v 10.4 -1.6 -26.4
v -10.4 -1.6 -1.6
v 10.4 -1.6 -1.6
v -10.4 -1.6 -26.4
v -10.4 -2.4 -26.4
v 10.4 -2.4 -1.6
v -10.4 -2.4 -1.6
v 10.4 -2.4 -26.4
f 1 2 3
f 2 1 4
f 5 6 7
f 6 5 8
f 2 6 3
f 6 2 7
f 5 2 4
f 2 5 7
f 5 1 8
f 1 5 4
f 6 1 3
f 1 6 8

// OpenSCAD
// file: ../p/4-4edge.scad
use <../lib.scad>
$fa=1; $fs=0.2;
function ldraw_lib__4_4edge(realsolid=false) = [
// 0 Circle 1.0
// 0 Name: 4-4edge.dat
// 0 Author: James Jessiman
// 0 !LDRAW_ORG Primitive UPDATE 2017-01
// 0 !LICENSE Licensed under CC BY 2.0 and CC BY 4.0 : see CAreadme.txt
// 
// 0 BFC CERTIFY CCW
  [0,"BFC","CERTIFY"],
  [0,"BFC","CCW"],
// 
// 0 !HISTORY 1998-12-15 [PTadmin] Official Update 1998-10
// 0 !HISTORY 2005-12-28 [PTadmin] Official Update 2005-01
// 0 !HISTORY 2007-06-24 [PTadmin] Header formatted for Contributor Agreement
// 0 !HISTORY 2008-07-01 [PTadmin] Official Update 2008-01
// 0 !HISTORY 2017-01-15 [Steffen] BFCed
// 0 !HISTORY 2017-12-30 [PTadmin] Official Update 2017-01
// 
// 
// 2 24 1 0 0 0.9239 0 0.3827
  [2,24,1,0,0,0.9239,0,0.3827],
// 2 24 0.9239 0 0.3827 0.7071 0 0.7071
  [2,24,0.9239,0,0.3827,0.7071,0,0.7071],
// 2 24 0.7071 0 0.7071 0.3827 0 0.9239
  [2,24,0.7071,0,0.7071,0.3827,0,0.9239],
// 2 24 0.3827 0 0.9239 0 0 1
  [2,24,0.3827,0,0.9239,0,0,1],
// 2 24 0 0 1 -0.3827 0 0.9239
  [2,24,0,0,1,-0.3827,0,0.9239],
// 2 24 -0.3827 0 0.9239 -0.7071 0 0.7071
  [2,24,-0.3827,0,0.9239,-0.7071,0,0.7071],
// 2 24 -0.7071 0 0.7071 -0.9239 0 0.3827
  [2,24,-0.7071,0,0.7071,-0.9239,0,0.3827],
// 2 24 -0.9239 0 0.3827 -1 0 -0
  [2,24,-0.9239,0,0.3827,-1,0,-0],
// 2 24 -1 0 -0 -0.9239 0 -0.3827
  [2,24,-1,0,-0,-0.9239,0,-0.3827],
// 2 24 -0.9239 0 -0.3827 -0.7071 0 -0.7071
  [2,24,-0.9239,0,-0.3827,-0.7071,0,-0.7071],
// 2 24 -0.7071 0 -0.7071 -0.3827 0 -0.9239
  [2,24,-0.7071,0,-0.7071,-0.3827,0,-0.9239],
// 2 24 -0.3827 0 -0.9239 0 0 -1
  [2,24,-0.3827,0,-0.9239,0,0,-1],
// 2 24 0 0 -1 0.3827 0 -0.9239
  [2,24,0,0,-1,0.3827,0,-0.9239],
// 2 24 0.3827 0 -0.9239 0.7071 0 -0.7071
  [2,24,0.3827,0,-0.9239,0.7071,0,-0.7071],
// 2 24 0.7071 0 -0.7071 0.9239 0 -0.3827
  [2,24,0.7071,0,-0.7071,0.9239,0,-0.3827],
// 2 24 0.9239 0 -0.3827 1 0 0
  [2,24,0.9239,0,-0.3827,1,0,0],
];
module ldraw_lib__4_4edge(step=0, col=false, unit=2/5, alt=false, line=0.2, solid=!$preview)
    makepoly(ldraw_lib__4_4edge(solid), step=step, col=col, unit=unit, alt=alt, line=line, solid=solid);
ldraw_lib__4_4edge(line=0.2);
// file: ../p/4-4disc.scad
use <../lib.scad>
$fa=1; $fs=0.2;
function ldraw_lib__4_4disc(realsolid=false) = [
// 0 Disc 1.0
// 0 Name: 4-4disc.dat
// 0 Author: James Jessiman
// 0 !LDRAW_ORG Primitive UPDATE 2002-02
// 0 !LICENSE Licensed under CC BY 2.0 and CC BY 4.0 : see CAreadme.txt
// 
// 0 BFC CERTIFY CCW
  [0,"BFC","CERTIFY"],
  [0,"BFC","CCW"],
// 
// 0 !HISTORY 1998-12-15 [PTadmin] Official Update 1998-10
// 0 !HISTORY 2002-03-23 [sbliss] Added BFC statement
// 0 !HISTORY 2002-04-25 [PTadmin] Official Update 2002-02
// 0 !HISTORY 2007-06-24 [PTadmin] Header formatted for Contributor Agreement
// 0 !HISTORY 2008-07-01 [PTadmin] Official Update 2008-01
// 
// 
// 3 16 0 0 0 1 0 0 0.9239 0 0.3827
  [3,16,0,0,0,1,0,0,0.9239,0,0.3827],
// 3 16 0 0 0 0.9239 0 0.3827 0.7071 0 0.7071
  [3,16,0,0,0,0.9239,0,0.3827,0.7071,0,0.7071],
// 3 16 0 0 0 0.7071 0 0.7071 0.3827 0 0.9239
  [3,16,0,0,0,0.7071,0,0.7071,0.3827,0,0.9239],
// 3 16 0 0 0 0.3827 0 0.9239 0 0 1
  [3,16,0,0,0,0.3827,0,0.9239,0,0,1],
// 3 16 0 0 0 0 0 1 -0.3827 0 0.9239
  [3,16,0,0,0,0,0,1,-0.3827,0,0.9239],
// 3 16 0 0 0 -0.3827 0 0.9239 -0.7071 0 0.7071
  [3,16,0,0,0,-0.3827,0,0.9239,-0.7071,0,0.7071],
// 3 16 0 0 0 -0.7071 0 0.7071 -0.9239 0 0.3827
  [3,16,0,0,0,-0.7071,0,0.7071,-0.9239,0,0.3827],
// 3 16 0 0 0 -0.9239 0 0.3827 -1 0 -0
  [3,16,0,0,0,-0.9239,0,0.3827,-1,0,-0],
// 3 16 0 0 0 -1 0 -0 -0.9239 0 -0.3827
  [3,16,0,0,0,-1,0,-0,-0.9239,0,-0.3827],
// 3 16 0 0 0 -0.9239 0 -0.3827 -0.7071 0 -0.7071
  [3,16,0,0,0,-0.9239,0,-0.3827,-0.7071,0,-0.7071],
// 3 16 0 0 0 -0.7071 0 -0.7071 -0.3827 0 -0.9239
  [3,16,0,0,0,-0.7071,0,-0.7071,-0.3827,0,-0.9239],
// 3 16 0 0 0 -0.3827 0 -0.9239 0 0 -1
  [3,16,0,0,0,-0.3827,0,-0.9239,0,0,-1],
// 3 16 0 0 0 0 0 -1 0.3827 0 -0.9239
  [3,16,0,0,0,0,0,-1,0.3827,0,-0.9239],
// 3 16 0 0 0 0.3827 0 -0.9239 0.7071 0 -0.7071
  [3,16,0,0,0,0.3827,0,-0.9239,0.7071,0,-0.7071],
// 3 16 0 0 0 0.7071 0 -0.7071 0.9239 0 -0.3827
  [3,16,0,0,0,0.7071,0,-0.7071,0.9239,0,-0.3827],
// 3 16 0 0 0 0.9239 0 -0.3827 1 0 0
  [3,16,0,0,0,0.9239,0,-0.3827,1,0,0],
// 0
];
module ldraw_lib__4_4disc(step=0, col=false, unit=2/5, alt=false, line=0.2, solid=!$preview)
    makepoly(ldraw_lib__4_4disc(solid), step=step, col=col, unit=unit, alt=alt, line=line, solid=solid);
ldraw_lib__4_4disc(line=0.2);
// file: ../p/4-4cyli.scad
use <../lib.scad>
$fa=1; $fs=0.2;
function ldraw_lib__4_4cyli(realsolid=false) = [
// 0 Cylinder 1.0
// 0 Name: 4-4cyli.dat
// 0 Author: James Jessiman
// 0 !LDRAW_ORG Primitive UPDATE 2005-01
// 0 !LICENSE Licensed under CC BY 2.0 and CC BY 4.0 : see CAreadme.txt
// 
// 0 BFC CERTIFY CCW
  [0,"BFC","CERTIFY"],
  [0,"BFC","CCW"],
// 
// 0 !HISTORY 1998-12-15 [PTadmin] Official Update 1998-10
// 0 !HISTORY 2002-03-23 [sbliss] Added BFC statement; merged headers from files in distributions LDraw 0.27 and Complete.
// 0 !HISTORY 2002-04-25 [PTadmin] Official Update 2002-02
// 0 !HISTORY 2004-12-14 [guyvivan] BFC CCW
// 0 !HISTORY 2005-12-28 [PTadmin] Official Update 2005-01
// 0 !HISTORY 2007-06-24 [PTadmin] Header formatted for Contributor Agreement
// 0 !HISTORY 2008-07-01 [PTadmin] Official Update 2008-01
// 
// 
// 4 16 1 1 0 0.9239 1 0.3827 0.9239 0 0.3827 1 0 0
  [4,16,1,1,0,0.9239,1,0.3827,0.9239,0,0.3827,1,0,0],
// 5 24 1 0 0 1 1 0 0.9239 0 0.3827 0.9239 0 -0.3827
  [5,24,1,0,0,1,1,0,0.9239,0,0.3827,0.9239,0,-0.3827],
// 4 16 0.9239 1 0.3827 0.7071 1 0.7071 0.7071 0 0.7071 0.9239 0 0.3827
  [4,16,0.9239,1,0.3827,0.7071,1,0.7071,0.7071,0,0.7071,0.9239,0,0.3827],
// 5 24 0.9239 0 0.3827 0.9239 1 0.3827 0.7071 0 0.7071 1 0 0
  [5,24,0.9239,0,0.3827,0.9239,1,0.3827,0.7071,0,0.7071,1,0,0],
// 4 16 0.7071 1 0.7071 0.3827 1 0.9239 0.3827 0 0.9239 0.7071 0 0.7071
  [4,16,0.7071,1,0.7071,0.3827,1,0.9239,0.3827,0,0.9239,0.7071,0,0.7071],
// 5 24 0.7071 0 0.7071 0.7071 1 0.7071 0.3827 0 0.9239 0.9239 0 0.3827
  [5,24,0.7071,0,0.7071,0.7071,1,0.7071,0.3827,0,0.9239,0.9239,0,0.3827],
// 4 16 0.3827 1 0.9239 0 1 1 0 0 1 0.3827 0 0.9239
  [4,16,0.3827,1,0.9239,0,1,1,0,0,1,0.3827,0,0.9239],
// 5 24 0.3827 0 0.9239 0.3827 1 0.9239 0 0 1 0.7071 0 0.7071
  [5,24,0.3827,0,0.9239,0.3827,1,0.9239,0,0,1,0.7071,0,0.7071],
// 4 16 0 1 1 -0.3827 1 0.9239 -0.3827 0 0.9239 0 0 1
  [4,16,0,1,1,-0.3827,1,0.9239,-0.3827,0,0.9239,0,0,1],
// 5 24 0 0 1 0 1 1 -0.3827 0 0.9239 0.3827 0 0.9239
  [5,24,0,0,1,0,1,1,-0.3827,0,0.9239,0.3827,0,0.9239],
// 4 16 -0.3827 1 0.9239 -0.7071 1 0.7071 -0.7071 0 0.7071 -0.3827 0 0.9239
  [4,16,-0.3827,1,0.9239,-0.7071,1,0.7071,-0.7071,0,0.7071,-0.3827,0,0.9239],
// 5 24 -0.3827 0 0.9239 -0.3827 1 0.9239 -0.7071 0 0.7071 0 0 1
  [5,24,-0.3827,0,0.9239,-0.3827,1,0.9239,-0.7071,0,0.7071,0,0,1],
// 4 16 -0.7071 1 0.7071 -0.9239 1 0.3827 -0.9239 0 0.3827 -0.7071 0 0.7071
  [4,16,-0.7071,1,0.7071,-0.9239,1,0.3827,-0.9239,0,0.3827,-0.7071,0,0.7071],
// 5 24 -0.7071 0 0.7071 -0.7071 1 0.7071 -0.9239 0 0.3827 -0.3827 0 0.9239
  [5,24,-0.7071,0,0.7071,-0.7071,1,0.7071,-0.9239,0,0.3827,-0.3827,0,0.9239],
// 4 16 -0.9239 1 0.3827 -1 1 0 -1 0 0 -0.9239 0 0.3827
  [4,16,-0.9239,1,0.3827,-1,1,0,-1,0,0,-0.9239,0,0.3827],
// 5 24 -0.9239 0 0.3827 -0.9239 1 0.3827 -1 0 0 -0.7071 0 0.7071
  [5,24,-0.9239,0,0.3827,-0.9239,1,0.3827,-1,0,0,-0.7071,0,0.7071],
// 4 16 -1 1 0 -0.9239 1 -0.3827 -0.9239 0 -0.3827 -1 0 0
  [4,16,-1,1,0,-0.9239,1,-0.3827,-0.9239,0,-0.3827,-1,0,0],
// 5 24 -1 0 0 -1 1 0 -0.9239 0 -0.3827 -0.9239 0 0.3827
  [5,24,-1,0,0,-1,1,0,-0.9239,0,-0.3827,-0.9239,0,0.3827],
// 4 16 -0.9239 1 -0.3827 -0.7071 1 -0.7071 -0.7071 0 -0.7071 -0.9239 0 -0.3827
  [4,16,-0.9239,1,-0.3827,-0.7071,1,-0.7071,-0.7071,0,-0.7071,-0.9239,0,-0.3827],
// 5 24 -0.9239 0 -0.3827 -0.9239 1 -0.3827 -0.7071 0 -0.7071 -1 0 0
  [5,24,-0.9239,0,-0.3827,-0.9239,1,-0.3827,-0.7071,0,-0.7071,-1,0,0],
// 4 16 -0.7071 1 -0.7071 -0.3827 1 -0.9239 -0.3827 0 -0.9239 -0.7071 0 -0.7071
  [4,16,-0.7071,1,-0.7071,-0.3827,1,-0.9239,-0.3827,0,-0.9239,-0.7071,0,-0.7071],
// 5 24 -0.7071 0 -0.7071 -0.7071 1 -0.7071 -0.3827 0 -0.9239 -0.9239 0 -0.3827
  [5,24,-0.7071,0,-0.7071,-0.7071,1,-0.7071,-0.3827,0,-0.9239,-0.9239,0,-0.3827],
// 4 16 -0.3827 1 -0.9239 0 1 -1 0 0 -1 -0.3827 0 -0.9239
  [4,16,-0.3827,1,-0.9239,0,1,-1,0,0,-1,-0.3827,0,-0.9239],
// 5 24 -0.3827 0 -0.9239 -0.3827 1 -0.9239 0 0 -1 -0.7071 0 -0.7071
  [5,24,-0.3827,0,-0.9239,-0.3827,1,-0.9239,0,0,-1,-0.7071,0,-0.7071],
// 4 16 0 1 -1 0.3827 1 -0.9239 0.3827 0 -0.9239 0 0 -1
  [4,16,0,1,-1,0.3827,1,-0.9239,0.3827,0,-0.9239,0,0,-1],
// 5 24 0 0 -1 0 1 -1 0.3827 0 -0.9239 -0.3827 0 -0.9239
  [5,24,0,0,-1,0,1,-1,0.3827,0,-0.9239,-0.3827,0,-0.9239],
// 4 16 0.3827 1 -0.9239 0.7071 1 -0.7071 0.7071 0 -0.7071 0.3827 0 -0.9239
  [4,16,0.3827,1,-0.9239,0.7071,1,-0.7071,0.7071,0,-0.7071,0.3827,0,-0.9239],
// 5 24 0.3827 0 -0.9239 0.3827 1 -0.9239 0.7071 0 -0.7071 0 0 -1
  [5,24,0.3827,0,-0.9239,0.3827,1,-0.9239,0.7071,0,-0.7071,0,0,-1],
// 4 16 0.7071 1 -0.7071 0.9239 1 -0.3827 0.9239 0 -0.3827 0.7071 0 -0.7071
  [4,16,0.7071,1,-0.7071,0.9239,1,-0.3827,0.9239,0,-0.3827,0.7071,0,-0.7071],
// 5 24 0.7071 0 -0.7071 0.7071 1 -0.7071 0.9239 0 -0.3827 0.3827 0 -0.9239
  [5,24,0.7071,0,-0.7071,0.7071,1,-0.7071,0.9239,0,-0.3827,0.3827,0,-0.9239],
// 4 16 0.9239 1 -0.3827 1 1 0 1 0 0 0.9239 0 -0.3827
  [4,16,0.9239,1,-0.3827,1,1,0,1,0,0,0.9239,0,-0.3827],
// 5 24 0.9239 0 -0.3827 0.9239 1 -0.3827 1 0 0 0.7071 0 -0.7071
  [5,24,0.9239,0,-0.3827,0.9239,1,-0.3827,1,0,0,0.7071,0,-0.7071],
// 0
];
module ldraw_lib__4_4cyli(step=0, col=false, unit=2/5, alt=false, line=0.2, solid=!$preview)
    makepoly(ldraw_lib__4_4cyli(solid), step=step, col=col, unit=unit, alt=alt, line=line, solid=solid);
ldraw_lib__4_4cyli(line=0.2);
// file: ../p/stud3.scad
use <../lib.scad>
use <4-4cyli.scad>
use <4-4disc.scad>
use <4-4edge.scad>
$fa=1; $fs=0.2;
function ldraw_lib__stud3(realsolid=false) = realsolid ? 
    [openscad(translate([0,0,-eps()], o=cylinder(4+eps(), r=4)),2)] : [
// 0 Stud Tube Solid
// 0 Name: stud3.dat
// 0 Author: James Jessiman
// 0 !LDRAW_ORG Primitive UPDATE 2012-01
// 0 !LICENSE Licensed under CC BY 2.0 and CC BY 4.0 : see CAreadme.txt
// 
// 0 BFC CERTIFY CCW
  [0,"BFC","CERTIFY"],
  [0,"BFC","CCW"],
// 
// 0 !HISTORY 2002-04-04 [sbliss] Modified for BFC compliance
// 0 !HISTORY 2002-04-25 [PTadmin] Official Update 2002-02
// 0 !HISTORY 2007-06-24 [PTadmin] Header formatted for Contributor Agreement
// 0 !HISTORY 2008-07-01 [PTadmin] Official Update 2008-01
// 0 !HISTORY 2012-02-16 [Philo] Changed to CCW
// 0 !HISTORY 2012-03-30 [PTadmin] Official Update 2012-01
// 
// 
// 1 16 0 -4 0 4 0 0 0 1 0 0 0 4 4-4edge.dat
  [1,16,0,-4,0,4,0,0,0,1,0,0,0,4, ldraw_lib__4_4edge(realsolid)],
// 1 16 0 0 0 4 0 0 0 1 0 0 0 4 4-4edge.dat
  [1,16,0,0,0,4,0,0,0,1,0,0,0,4, ldraw_lib__4_4edge(realsolid)],
// 1 16 0 -4 0 4 0 0 0 1 0 0 0 4 4-4disc.dat
  [1,16,0,-4,0,4,0,0,0,1,0,0,0,4, ldraw_lib__4_4disc(realsolid)],
// 1 16 0 -4 0 4 0 0 0 4 0 0 0 4 4-4cyli.dat
  [1,16,0,-4,0,4,0,0,0,4,0,0,0,4, ldraw_lib__4_4cyli(realsolid)],
];
module ldraw_lib__stud3(step=0, col=false, unit=2/5, alt=false, line=0.2, solid=!$preview)
    makepoly(ldraw_lib__stud3(solid), step=step, col=col, unit=unit, alt=alt, line=line, solid=solid);
ldraw_lib__stud3(line=0.2);
// file: ../p/stud.scad
use <../lib.scad>
use <4-4cyli.scad>
use <4-4disc.scad>
use <4-4edge.scad>
$fa=1; $fs=0.2;
function ldraw_lib__stud(realsolid=false) = realsolid ? 
    [openscad(translate([0,0,-eps()], o=cylinder(4+eps(), r=6)),2)] : [
// 0 Stud
// 0 Name: stud.dat
// 0 Author: James Jessiman
// 0 !LDRAW_ORG Primitive UPDATE 2012-01
// 0 !LICENSE Licensed under CC BY 2.0 and CC BY 4.0 : see CAreadme.txt
// 
// 0 BFC CERTIFY CCW
  [0,"BFC","CERTIFY"],
  [0,"BFC","CCW"],
// 
// 0 !HISTORY 2002-04-04 [sbliss] Modified for BFC compliance
// 0 !HISTORY 2002-04-25 [PTadmin] Official Update 2002-02
// 0 !HISTORY 2007-06-24 [PTadmin] Header formatted for Contributor Agreement
// 0 !HISTORY 2008-07-01 [PTadmin] Official Update 2008-01
// 0 !HISTORY 2012-02-16 [Philo] Changed to CCW
// 0 !HISTORY 2012-03-30 [PTadmin] Official Update 2012-01
// 
// 
// 1 16 0 0 0 6 0 0 0 1 0 0 0 6 4-4edge.dat
  [1,16,0,0,0,6,0,0,0,1,0,0,0,6, ldraw_lib__4_4edge(realsolid)],
// 1 16 0 -4 0 6 0 0 0 1 0 0 0 6 4-4edge.dat
  [1,16,0,-4,0,6,0,0,0,1,0,0,0,6, ldraw_lib__4_4edge(realsolid)],
// 1 16 0 0 0 6 0 0 0 -4 0 0 0 6 4-4cyli.dat
  [1,16,0,0,0,6,0,0,0,-4,0,0,0,6, ldraw_lib__4_4cyli(realsolid)],
// 1 16 0 -4 0 6 0 0 0 1 0 0 0 6 4-4disc.dat
  [1,16,0,-4,0,6,0,0,0,1,0,0,0,6, ldraw_lib__4_4disc(realsolid)],
];
module ldraw_lib__stud(step=0, col=false, unit=2/5, alt=false, line=0.2, solid=!$preview)
    makepoly(ldraw_lib__stud(solid), step=step, col=col, unit=unit, alt=alt, line=line, solid=solid);
ldraw_lib__stud(line=0.2);
// file: ../p/box5.scad
use <../lib.scad>
$fa=1; $fs=0.2;
function ldraw_lib__box5(realsolid=false) = [
// 0 Box with 5 Faces and All Edges
// 0 Name: box5.dat
// 0 Author: James Jessiman
// 0 !LDRAW_ORG Primitive UPDATE 2012-01
// 0 !LICENSE Licensed under CC BY 2.0 and CC BY 4.0 : see CAreadme.txt
// 
// 0 BFC CERTIFY CCW
  [0,"BFC","CERTIFY"],
  [0,"BFC","CCW"],
// 
// 0 !HISTORY 2002-04-03 [sbliss] Modified for BFC compliance
// 0 !HISTORY 2002-04-25 [PTadmin] Official Update 2002-02
// 0 !HISTORY 2007-06-24 [PTadmin] Header formatted for Contributor Agreement
// 0 !HISTORY 2008-07-01 [PTadmin] Official Update 2008-01
// 0 !HISTORY 2012-02-16 [Philo] Changed to CCW
// 0 !HISTORY 2012-03-30 [PTadmin] Official Update 2012-01
// 
// 
// 2 24 1 1 1 -1 1 1
  [2,24,1,1,1,-1,1,1],
// 2 24 -1 1 1 -1 1 -1
  [2,24,-1,1,1,-1,1,-1],
// 2 24 -1 1 -1 1 1 -1
  [2,24,-1,1,-1,1,1,-1],
// 2 24 1 1 -1 1 1 1
  [2,24,1,1,-1,1,1,1],
// 2 24 1 0 1 -1 0 1
  [2,24,1,0,1,-1,0,1],
// 2 24 -1 0 1 -1 0 -1
  [2,24,-1,0,1,-1,0,-1],
// 2 24 -1 0 -1 1 0 -1
  [2,24,-1,0,-1,1,0,-1],
// 2 24 1 0 -1 1 0 1
  [2,24,1,0,-1,1,0,1],
// 2 24 1 0 1 1 1 1
  [2,24,1,0,1,1,1,1],
// 2 24 -1 0 1 -1 1 1
  [2,24,-1,0,1,-1,1,1],
// 2 24 1 0 -1 1 1 -1
  [2,24,1,0,-1,1,1,-1],
// 2 24 -1 0 -1 -1 1 -1
  [2,24,-1,0,-1,-1,1,-1],
// 4 16 -1 1 1 1 1 1 1 1 -1 -1 1 -1
  [4,16,-1,1,1,1,1,1,1,1,-1,-1,1,-1],
// 4 16 -1 1 1 -1 0 1 1 0 1 1 1 1
  [4,16,-1,1,1,-1,0,1,1,0,1,1,1,1],
// 4 16 -1 1 -1 -1 0 -1 -1 0 1 -1 1 1
  [4,16,-1,1,-1,-1,0,-1,-1,0,1,-1,1,1],
// 4 16 1 1 -1 1 0 -1 -1 0 -1 -1 1 -1
  [4,16,1,1,-1,1,0,-1,-1,0,-1,-1,1,-1],
// 4 16 1 1 1 1 0 1 1 0 -1 1 1 -1
  [4,16,1,1,1,1,0,1,1,0,-1,1,1,-1],
];
module ldraw_lib__box5(step=0, col=false, unit=2/5, alt=false, line=0.2, solid=!$preview)
    makepoly(ldraw_lib__box5(solid), step=step, col=col, unit=unit, alt=alt, line=line, solid=solid);
ldraw_lib__box5(line=0.2);
// file: ../p/box4t.scad
use <../lib.scad>
$fa=1; $fs=0.2;
function ldraw_lib__box4t(realsolid=false) = [
// 0 Box with 4 Adjacent Faces and All Edges
// 0 Name: box4t.dat
// 0 Author: Tore Eriksson [Tore_Eriksson]
// 0 !LDRAW_ORG Primitive UPDATE 2003-02
// 0 !LICENSE Licensed under CC BY 2.0 and CC BY 4.0 : see CAreadme.txt
// 
// 0 BFC CERTIFY CCW
  [0,"BFC","CERTIFY"],
  [0,"BFC","CCW"],
// 
// 0 !HISTORY 1997-09-29 [PTadmin] Official Update 1997-15
// 0 !HISTORY 2002-08-31 [izanette] Modified with WINDZ for BFC compliance
// 0 !HISTORY 2003-08-01 [PTadmin] Official Update 2003-02
// 0 !HISTORY 2007-06-24 [PTadmin] Header formatted for Contributor Agreement
// 0 !HISTORY 2008-07-01 [PTadmin] Official Update 2008-01
// 
// 
// 2 24 1 1 1 -1 1 1
  [2,24,1,1,1,-1,1,1],
// 2 24 -1 1 1 -1 1 -1
  [2,24,-1,1,1,-1,1,-1],
// 2 24 -1 1 -1 1 1 -1
  [2,24,-1,1,-1,1,1,-1],
// 2 24 1 1 -1 1 1 1
  [2,24,1,1,-1,1,1,1],
// 2 24 1 0 1 -1 0 1
  [2,24,1,0,1,-1,0,1],
// 2 24 -1 0 1 -1 0 -1
  [2,24,-1,0,1,-1,0,-1],
// 2 24 -1 0 -1 1 0 -1
  [2,24,-1,0,-1,1,0,-1],
// 2 24 1 0 -1 1 0 1
  [2,24,1,0,-1,1,0,1],
// 2 24 1 0 1 1 1 1
  [2,24,1,0,1,1,1,1],
// 2 24 -1 0 1 -1 1 1
  [2,24,-1,0,1,-1,1,1],
// 2 24 1 0 -1 1 1 -1
  [2,24,1,0,-1,1,1,-1],
// 2 24 -1 0 -1 -1 1 -1
  [2,24,-1,0,-1,-1,1,-1],
// 4 16 1 1 1 1 1 -1 -1 1 -1 -1 1 1
  [4,16,1,1,1,1,1,-1,-1,1,-1,-1,1,1],
// 4 16 1 1 1 -1 1 1 -1 0 1 1 0 1
  [4,16,1,1,1,-1,1,1,-1,0,1,1,0,1],
// 4 16 -1 1 1 -1 1 -1 -1 0 -1 -1 0 1
  [4,16,-1,1,1,-1,1,-1,-1,0,-1,-1,0,1],
// 0 4 16 -1 1 -1 -1 0 -1 1 0 -1 1 1 -1
// 4 16 1 1 -1 1 1 1 1 0 1 1 0 -1
  [4,16,1,1,-1,1,1,1,1,0,1,1,0,-1],
// 0
];
module ldraw_lib__box4t(step=0, col=false, unit=2/5, alt=false, line=0.2, solid=!$preview)
    makepoly(ldraw_lib__box4t(solid), step=step, col=col, unit=unit, alt=alt, line=line, solid=solid);
ldraw_lib__box4t(line=0.2);
// file: s/3004s01.scad
use <../../lib.scad>
use <../../p/box4t.scad>
use <../../p/box5.scad>
use <../../p/stud.scad>
use <../../p/stud3.scad>
$fa=1; $fs=0.2;
function ldraw_lib__s__3004s01(realsolid=false) = [
// 0 ~Brick  1 x  2 without Front Face
// 0 Name: s\3004s01.dat
// 0 Author: James Jessiman
// 0 !LDRAW_ORG Subpart UPDATE 2003-03
// 0 !LICENSE Licensed under CC BY 2.0 and CC BY 4.0 : see CAreadme.txt
// 
// 0 BFC CERTIFY CCW
  [0,"BFC","CERTIFY"],
  [0,"BFC","CCW"],
// 
// 0 !HISTORY 2003-09-07 [jriley] Subfiling, BFC
// 0 !HISTORY 2003-12-19 [PTadmin] Official Update 2003-03
// 0 !HISTORY 2007-08-29 [PTadmin] Header formatted for Contributor Agreement
// 0 !HISTORY 2008-07-01 [PTadmin] Official Update 2008-01
// 
// 
// 1 16 0 4 0 1 0 0 0 -5 0 0 0 1 stud3.dat
  [1,16,0,4,0,1,0,0,0,-5,0,0,0,1, ldraw_lib__stud3(realsolid)],
// 0 BFC INVERTNEXT
  [0,"BFC","INVERTNEXT"],
// 1 16 0 24 0 16 0 0 0 -20 0 0 0 6 box5.dat
  [1,16,0,24,0,16,0,0,0,-20,0,0,0,6, ldraw_lib__box5(realsolid)],
// 4 16 20 24 10 16 24 6 -16 24 6 -20 24 10
  [4,16,20,24,10,16,24,6,-16,24,6,-20,24,10],
// 4 16 -20 24 10 -16 24 6 -16 24 -6 -20 24 -10
  [4,16,-20,24,10,-16,24,6,-16,24,-6,-20,24,-10],
// 4 16 -20 24 -10 -16 24 -6 16 24 -6 20 24 -10
  [4,16,-20,24,-10,-16,24,-6,16,24,-6,20,24,-10],
// 4 16 20 24 -10 16 24 -6 16 24 6 20 24 10
  [4,16,20,24,-10,16,24,-6,16,24,6,20,24,10],
// 1 16 0 24 0 20 0 0 0 -24 0 0 0 10 box4t.dat
  [1,16,0,24,0,20,0,0,0,-24,0,0,0,10, ldraw_lib__box4t(realsolid)],
// 1 16 10 0 0 1 0 0 0 1 0 0 0 1 stud.dat
  [1,16,10,0,0,1,0,0,0,1,0,0,0,1, ldraw_lib__stud(realsolid)],
// 1 16 -10 0 0 1 0 0 0 1 0 0 0 1 stud.dat
  [1,16,-10,0,0,1,0,0,0,1,0,0,0,1, ldraw_lib__stud(realsolid)],
// 0
];
module ldraw_lib__s__3004s01(step=0, col=false, unit=2/5, alt=false, line=0.2, solid=!$preview)
    makepoly(ldraw_lib__s__3004s01(solid), step=step, col=col, unit=unit, alt=alt, line=line, solid=solid);
ldraw_lib__s__3004s01(line=0.2);
// file: 3004.scad
use <../lib.scad>
use <s/3004s01.scad>
$fa=1; $fs=0.2;
function ldraw_lib__3004(realsolid=false) = [
// 0 Brick  1 x  2
// 0 Name: 3004.dat
// 0 Author: James Jessiman
// 0 !LDRAW_ORG Part UPDATE 2022-05
// 0 !LICENSE Licensed under CC BY 2.0 and CC BY 4.0 : see CAreadme.txt
// 
// 0 BFC CERTIFY CCW
  [0,"BFC","CERTIFY"],
  [0,"BFC","CCW"],
// 
// 0 !HISTORY 2001-10-26 [PTadmin] Official Update 2001-01
// 0 !HISTORY 2002-05-07 {unknown} BFC Certification
// 0 !HISTORY 2002-06-11 [PTadmin] Official Update 2002-03
// 0 !HISTORY 2007-05-07 [PTadmin] Header formatted for Contributor Agreement
// 0 !HISTORY 2008-07-01 [PTadmin] Official Update 2008-01
// 0 !HISTORY 2022-08-04 [MagFors] Using subfile
// 0 !HISTORY 2022-09-15 [PTadmin] Official Update 2022-05
// 
// 
// 1 16 0 0 0 1 0 0 0 1 0 0 0 1 s\3004s01.dat
  [1,16,0,0,0,1,0,0,0,1,0,0,0,1, ldraw_lib__s__3004s01(realsolid)],
// 4 16 -20 24 -10 20 24 -10 20 0 -10 -20 0 -10
  [4,16,-20,24,-10,20,24,-10,20,0,-10,-20,0,-10],
];
module ldraw_lib__3004(step=0, col=false, unit=2/5, alt=false, line=0.2, solid=!$preview)
    makepoly(ldraw_lib__3004(solid), step=step, col=col, unit=unit, alt=alt, line=line, solid=solid);
ldraw_lib__3004(line=0.2);
// file: ../p/box.scad
use <../lib.scad>
$fa=1; $fs=0.2;
function ldraw_lib__box(realsolid=false) = [
// 0 Box 6 (six faces)
// 0 Name: box.dat
// 0 Author: James Jessiman
// 0 !LDRAW_ORG Primitive UPDATE 2002-05
// 0 !LICENSE Licensed under CC BY 2.0 and CC BY 4.0 : see CAreadme.txt
// 
// 0 BFC CERTIFY CCW
  [0,"BFC","CERTIFY"],
  [0,"BFC","CCW"],
// 
// 0 !HISTORY 2002-08-22 [sbliss] Applied BFC
// 0 !HISTORY 2002-11-30 [PTadmin] Official Update 2002-05
// 0 !HISTORY 2007-06-24 [PTadmin] Header formatted for Contributor Agreement
// 0 !HISTORY 2008-07-01 [PTadmin] Official Update 2008-01
// 
// 
// 2 24 1 1 1 -1 1 1
  [2,24,1,1,1,-1,1,1],
// 2 24 -1 1 1 -1 1 -1
  [2,24,-1,1,1,-1,1,-1],
// 2 24 -1 1 -1 1 1 -1
  [2,24,-1,1,-1,1,1,-1],
// 2 24 1 1 -1 1 1 1
  [2,24,1,1,-1,1,1,1],
// 2 24 1 -1 1 -1 -1 1
  [2,24,1,-1,1,-1,-1,1],
// 2 24 -1 -1 1 -1 -1 -1
  [2,24,-1,-1,1,-1,-1,-1],
// 2 24 -1 -1 -1 1 -1 -1
  [2,24,-1,-1,-1,1,-1,-1],
// 2 24 1 -1 -1 1 -1 1
  [2,24,1,-1,-1,1,-1,1],
// 2 24 1 -1 1 1 1 1
  [2,24,1,-1,1,1,1,1],
// 2 24 -1 -1 1 -1 1 1
  [2,24,-1,-1,1,-1,1,1],
// 2 24 1 -1 -1 1 1 -1
  [2,24,1,-1,-1,1,1,-1],
// 2 24 -1 -1 -1 -1 1 -1
  [2,24,-1,-1,-1,-1,1,-1],
// 4 16 1 1 1 1 1 -1 -1 1 -1 -1 1 1
  [4,16,1,1,1,1,1,-1,-1,1,-1,-1,1,1],
// 4 16 -1 -1 -1 1 -1 -1 1 -1 1 -1 -1 1
  [4,16,-1,-1,-1,1,-1,-1,1,-1,1,-1,-1,1],
// 4 16 -1 -1 1 1 -1 1 1 1 1 -1 1 1
  [4,16,-1,-1,1,1,-1,1,1,1,1,-1,1,1],
// 4 16 -1 -1 -1 -1 -1 1 -1 1 1 -1 1 -1
  [4,16,-1,-1,-1,-1,-1,1,-1,1,1,-1,1,-1],
// 4 16 1 -1 -1 -1 -1 -1 -1 1 -1 1 1 -1
  [4,16,1,-1,-1,-1,-1,-1,-1,1,-1,1,1,-1],
// 4 16 1 -1 1 1 -1 -1 1 1 -1 1 1 1
  [4,16,1,-1,1,1,-1,-1,1,1,-1,1,1,1],
// 0
];
module ldraw_lib__box(step=0, col=false, unit=2/5, alt=false, line=0.2, solid=!$preview)
    makepoly(ldraw_lib__box(solid), step=step, col=col, unit=unit, alt=alt, line=line, solid=solid);
ldraw_lib__box(line=0.2);
// main file
use <../lib.scad>
use <../p/box.scad>
$fa=1; $fs=0.2;
function ldraw_lib__u8036(realsolid=false) = [
// 0 ~Mursten Glass for Window  1 x  3 x  3
// 0 Name: u8036.dat
// 0 Author: J.C. Tchang [tchang]
// 0 !LDRAW_ORG Part UPDATE 2019-02
// 0 !LICENSE Licensed under CC BY 2.0 and CC BY 4.0 : see CAreadme.txt
// 
// 0 BFC CERTIFY CCW
  [0,"BFC","CERTIFY"],
  [0,"BFC","CCW"],
// 
// 0 !CATEGORY Window
// 0 !KEYWORDS Automatic Binding Brick
// 
// 0 !CMDLINE -c47
// 
// 0 !HISTORY 2019-06-04 [Holly-Wood] Inverted BFC, substituted prims, adjusted size and position, separated glass in separate file
// 0 !HISTORY 2019-09-09 [PTadmin] Official Update 2019-02
// 
// 
// 1 16 0 35 -5 26 0 0 0 0 -31 0 1 0 box.dat
  [1,16,0,35,-5,26,0,0,0,0,-31,0,1,0, ldraw_lib__box(realsolid)],
];
module ldraw_lib__u8036(step=0, col=false, unit=2/5, alt=false, line=0.2, solid=!$preview)
    makepoly(ldraw_lib__u8036(solid), step=step, col=col, unit=unit, alt=alt, line=line, solid=solid);
ldraw_lib__u8036(line=0.2);
